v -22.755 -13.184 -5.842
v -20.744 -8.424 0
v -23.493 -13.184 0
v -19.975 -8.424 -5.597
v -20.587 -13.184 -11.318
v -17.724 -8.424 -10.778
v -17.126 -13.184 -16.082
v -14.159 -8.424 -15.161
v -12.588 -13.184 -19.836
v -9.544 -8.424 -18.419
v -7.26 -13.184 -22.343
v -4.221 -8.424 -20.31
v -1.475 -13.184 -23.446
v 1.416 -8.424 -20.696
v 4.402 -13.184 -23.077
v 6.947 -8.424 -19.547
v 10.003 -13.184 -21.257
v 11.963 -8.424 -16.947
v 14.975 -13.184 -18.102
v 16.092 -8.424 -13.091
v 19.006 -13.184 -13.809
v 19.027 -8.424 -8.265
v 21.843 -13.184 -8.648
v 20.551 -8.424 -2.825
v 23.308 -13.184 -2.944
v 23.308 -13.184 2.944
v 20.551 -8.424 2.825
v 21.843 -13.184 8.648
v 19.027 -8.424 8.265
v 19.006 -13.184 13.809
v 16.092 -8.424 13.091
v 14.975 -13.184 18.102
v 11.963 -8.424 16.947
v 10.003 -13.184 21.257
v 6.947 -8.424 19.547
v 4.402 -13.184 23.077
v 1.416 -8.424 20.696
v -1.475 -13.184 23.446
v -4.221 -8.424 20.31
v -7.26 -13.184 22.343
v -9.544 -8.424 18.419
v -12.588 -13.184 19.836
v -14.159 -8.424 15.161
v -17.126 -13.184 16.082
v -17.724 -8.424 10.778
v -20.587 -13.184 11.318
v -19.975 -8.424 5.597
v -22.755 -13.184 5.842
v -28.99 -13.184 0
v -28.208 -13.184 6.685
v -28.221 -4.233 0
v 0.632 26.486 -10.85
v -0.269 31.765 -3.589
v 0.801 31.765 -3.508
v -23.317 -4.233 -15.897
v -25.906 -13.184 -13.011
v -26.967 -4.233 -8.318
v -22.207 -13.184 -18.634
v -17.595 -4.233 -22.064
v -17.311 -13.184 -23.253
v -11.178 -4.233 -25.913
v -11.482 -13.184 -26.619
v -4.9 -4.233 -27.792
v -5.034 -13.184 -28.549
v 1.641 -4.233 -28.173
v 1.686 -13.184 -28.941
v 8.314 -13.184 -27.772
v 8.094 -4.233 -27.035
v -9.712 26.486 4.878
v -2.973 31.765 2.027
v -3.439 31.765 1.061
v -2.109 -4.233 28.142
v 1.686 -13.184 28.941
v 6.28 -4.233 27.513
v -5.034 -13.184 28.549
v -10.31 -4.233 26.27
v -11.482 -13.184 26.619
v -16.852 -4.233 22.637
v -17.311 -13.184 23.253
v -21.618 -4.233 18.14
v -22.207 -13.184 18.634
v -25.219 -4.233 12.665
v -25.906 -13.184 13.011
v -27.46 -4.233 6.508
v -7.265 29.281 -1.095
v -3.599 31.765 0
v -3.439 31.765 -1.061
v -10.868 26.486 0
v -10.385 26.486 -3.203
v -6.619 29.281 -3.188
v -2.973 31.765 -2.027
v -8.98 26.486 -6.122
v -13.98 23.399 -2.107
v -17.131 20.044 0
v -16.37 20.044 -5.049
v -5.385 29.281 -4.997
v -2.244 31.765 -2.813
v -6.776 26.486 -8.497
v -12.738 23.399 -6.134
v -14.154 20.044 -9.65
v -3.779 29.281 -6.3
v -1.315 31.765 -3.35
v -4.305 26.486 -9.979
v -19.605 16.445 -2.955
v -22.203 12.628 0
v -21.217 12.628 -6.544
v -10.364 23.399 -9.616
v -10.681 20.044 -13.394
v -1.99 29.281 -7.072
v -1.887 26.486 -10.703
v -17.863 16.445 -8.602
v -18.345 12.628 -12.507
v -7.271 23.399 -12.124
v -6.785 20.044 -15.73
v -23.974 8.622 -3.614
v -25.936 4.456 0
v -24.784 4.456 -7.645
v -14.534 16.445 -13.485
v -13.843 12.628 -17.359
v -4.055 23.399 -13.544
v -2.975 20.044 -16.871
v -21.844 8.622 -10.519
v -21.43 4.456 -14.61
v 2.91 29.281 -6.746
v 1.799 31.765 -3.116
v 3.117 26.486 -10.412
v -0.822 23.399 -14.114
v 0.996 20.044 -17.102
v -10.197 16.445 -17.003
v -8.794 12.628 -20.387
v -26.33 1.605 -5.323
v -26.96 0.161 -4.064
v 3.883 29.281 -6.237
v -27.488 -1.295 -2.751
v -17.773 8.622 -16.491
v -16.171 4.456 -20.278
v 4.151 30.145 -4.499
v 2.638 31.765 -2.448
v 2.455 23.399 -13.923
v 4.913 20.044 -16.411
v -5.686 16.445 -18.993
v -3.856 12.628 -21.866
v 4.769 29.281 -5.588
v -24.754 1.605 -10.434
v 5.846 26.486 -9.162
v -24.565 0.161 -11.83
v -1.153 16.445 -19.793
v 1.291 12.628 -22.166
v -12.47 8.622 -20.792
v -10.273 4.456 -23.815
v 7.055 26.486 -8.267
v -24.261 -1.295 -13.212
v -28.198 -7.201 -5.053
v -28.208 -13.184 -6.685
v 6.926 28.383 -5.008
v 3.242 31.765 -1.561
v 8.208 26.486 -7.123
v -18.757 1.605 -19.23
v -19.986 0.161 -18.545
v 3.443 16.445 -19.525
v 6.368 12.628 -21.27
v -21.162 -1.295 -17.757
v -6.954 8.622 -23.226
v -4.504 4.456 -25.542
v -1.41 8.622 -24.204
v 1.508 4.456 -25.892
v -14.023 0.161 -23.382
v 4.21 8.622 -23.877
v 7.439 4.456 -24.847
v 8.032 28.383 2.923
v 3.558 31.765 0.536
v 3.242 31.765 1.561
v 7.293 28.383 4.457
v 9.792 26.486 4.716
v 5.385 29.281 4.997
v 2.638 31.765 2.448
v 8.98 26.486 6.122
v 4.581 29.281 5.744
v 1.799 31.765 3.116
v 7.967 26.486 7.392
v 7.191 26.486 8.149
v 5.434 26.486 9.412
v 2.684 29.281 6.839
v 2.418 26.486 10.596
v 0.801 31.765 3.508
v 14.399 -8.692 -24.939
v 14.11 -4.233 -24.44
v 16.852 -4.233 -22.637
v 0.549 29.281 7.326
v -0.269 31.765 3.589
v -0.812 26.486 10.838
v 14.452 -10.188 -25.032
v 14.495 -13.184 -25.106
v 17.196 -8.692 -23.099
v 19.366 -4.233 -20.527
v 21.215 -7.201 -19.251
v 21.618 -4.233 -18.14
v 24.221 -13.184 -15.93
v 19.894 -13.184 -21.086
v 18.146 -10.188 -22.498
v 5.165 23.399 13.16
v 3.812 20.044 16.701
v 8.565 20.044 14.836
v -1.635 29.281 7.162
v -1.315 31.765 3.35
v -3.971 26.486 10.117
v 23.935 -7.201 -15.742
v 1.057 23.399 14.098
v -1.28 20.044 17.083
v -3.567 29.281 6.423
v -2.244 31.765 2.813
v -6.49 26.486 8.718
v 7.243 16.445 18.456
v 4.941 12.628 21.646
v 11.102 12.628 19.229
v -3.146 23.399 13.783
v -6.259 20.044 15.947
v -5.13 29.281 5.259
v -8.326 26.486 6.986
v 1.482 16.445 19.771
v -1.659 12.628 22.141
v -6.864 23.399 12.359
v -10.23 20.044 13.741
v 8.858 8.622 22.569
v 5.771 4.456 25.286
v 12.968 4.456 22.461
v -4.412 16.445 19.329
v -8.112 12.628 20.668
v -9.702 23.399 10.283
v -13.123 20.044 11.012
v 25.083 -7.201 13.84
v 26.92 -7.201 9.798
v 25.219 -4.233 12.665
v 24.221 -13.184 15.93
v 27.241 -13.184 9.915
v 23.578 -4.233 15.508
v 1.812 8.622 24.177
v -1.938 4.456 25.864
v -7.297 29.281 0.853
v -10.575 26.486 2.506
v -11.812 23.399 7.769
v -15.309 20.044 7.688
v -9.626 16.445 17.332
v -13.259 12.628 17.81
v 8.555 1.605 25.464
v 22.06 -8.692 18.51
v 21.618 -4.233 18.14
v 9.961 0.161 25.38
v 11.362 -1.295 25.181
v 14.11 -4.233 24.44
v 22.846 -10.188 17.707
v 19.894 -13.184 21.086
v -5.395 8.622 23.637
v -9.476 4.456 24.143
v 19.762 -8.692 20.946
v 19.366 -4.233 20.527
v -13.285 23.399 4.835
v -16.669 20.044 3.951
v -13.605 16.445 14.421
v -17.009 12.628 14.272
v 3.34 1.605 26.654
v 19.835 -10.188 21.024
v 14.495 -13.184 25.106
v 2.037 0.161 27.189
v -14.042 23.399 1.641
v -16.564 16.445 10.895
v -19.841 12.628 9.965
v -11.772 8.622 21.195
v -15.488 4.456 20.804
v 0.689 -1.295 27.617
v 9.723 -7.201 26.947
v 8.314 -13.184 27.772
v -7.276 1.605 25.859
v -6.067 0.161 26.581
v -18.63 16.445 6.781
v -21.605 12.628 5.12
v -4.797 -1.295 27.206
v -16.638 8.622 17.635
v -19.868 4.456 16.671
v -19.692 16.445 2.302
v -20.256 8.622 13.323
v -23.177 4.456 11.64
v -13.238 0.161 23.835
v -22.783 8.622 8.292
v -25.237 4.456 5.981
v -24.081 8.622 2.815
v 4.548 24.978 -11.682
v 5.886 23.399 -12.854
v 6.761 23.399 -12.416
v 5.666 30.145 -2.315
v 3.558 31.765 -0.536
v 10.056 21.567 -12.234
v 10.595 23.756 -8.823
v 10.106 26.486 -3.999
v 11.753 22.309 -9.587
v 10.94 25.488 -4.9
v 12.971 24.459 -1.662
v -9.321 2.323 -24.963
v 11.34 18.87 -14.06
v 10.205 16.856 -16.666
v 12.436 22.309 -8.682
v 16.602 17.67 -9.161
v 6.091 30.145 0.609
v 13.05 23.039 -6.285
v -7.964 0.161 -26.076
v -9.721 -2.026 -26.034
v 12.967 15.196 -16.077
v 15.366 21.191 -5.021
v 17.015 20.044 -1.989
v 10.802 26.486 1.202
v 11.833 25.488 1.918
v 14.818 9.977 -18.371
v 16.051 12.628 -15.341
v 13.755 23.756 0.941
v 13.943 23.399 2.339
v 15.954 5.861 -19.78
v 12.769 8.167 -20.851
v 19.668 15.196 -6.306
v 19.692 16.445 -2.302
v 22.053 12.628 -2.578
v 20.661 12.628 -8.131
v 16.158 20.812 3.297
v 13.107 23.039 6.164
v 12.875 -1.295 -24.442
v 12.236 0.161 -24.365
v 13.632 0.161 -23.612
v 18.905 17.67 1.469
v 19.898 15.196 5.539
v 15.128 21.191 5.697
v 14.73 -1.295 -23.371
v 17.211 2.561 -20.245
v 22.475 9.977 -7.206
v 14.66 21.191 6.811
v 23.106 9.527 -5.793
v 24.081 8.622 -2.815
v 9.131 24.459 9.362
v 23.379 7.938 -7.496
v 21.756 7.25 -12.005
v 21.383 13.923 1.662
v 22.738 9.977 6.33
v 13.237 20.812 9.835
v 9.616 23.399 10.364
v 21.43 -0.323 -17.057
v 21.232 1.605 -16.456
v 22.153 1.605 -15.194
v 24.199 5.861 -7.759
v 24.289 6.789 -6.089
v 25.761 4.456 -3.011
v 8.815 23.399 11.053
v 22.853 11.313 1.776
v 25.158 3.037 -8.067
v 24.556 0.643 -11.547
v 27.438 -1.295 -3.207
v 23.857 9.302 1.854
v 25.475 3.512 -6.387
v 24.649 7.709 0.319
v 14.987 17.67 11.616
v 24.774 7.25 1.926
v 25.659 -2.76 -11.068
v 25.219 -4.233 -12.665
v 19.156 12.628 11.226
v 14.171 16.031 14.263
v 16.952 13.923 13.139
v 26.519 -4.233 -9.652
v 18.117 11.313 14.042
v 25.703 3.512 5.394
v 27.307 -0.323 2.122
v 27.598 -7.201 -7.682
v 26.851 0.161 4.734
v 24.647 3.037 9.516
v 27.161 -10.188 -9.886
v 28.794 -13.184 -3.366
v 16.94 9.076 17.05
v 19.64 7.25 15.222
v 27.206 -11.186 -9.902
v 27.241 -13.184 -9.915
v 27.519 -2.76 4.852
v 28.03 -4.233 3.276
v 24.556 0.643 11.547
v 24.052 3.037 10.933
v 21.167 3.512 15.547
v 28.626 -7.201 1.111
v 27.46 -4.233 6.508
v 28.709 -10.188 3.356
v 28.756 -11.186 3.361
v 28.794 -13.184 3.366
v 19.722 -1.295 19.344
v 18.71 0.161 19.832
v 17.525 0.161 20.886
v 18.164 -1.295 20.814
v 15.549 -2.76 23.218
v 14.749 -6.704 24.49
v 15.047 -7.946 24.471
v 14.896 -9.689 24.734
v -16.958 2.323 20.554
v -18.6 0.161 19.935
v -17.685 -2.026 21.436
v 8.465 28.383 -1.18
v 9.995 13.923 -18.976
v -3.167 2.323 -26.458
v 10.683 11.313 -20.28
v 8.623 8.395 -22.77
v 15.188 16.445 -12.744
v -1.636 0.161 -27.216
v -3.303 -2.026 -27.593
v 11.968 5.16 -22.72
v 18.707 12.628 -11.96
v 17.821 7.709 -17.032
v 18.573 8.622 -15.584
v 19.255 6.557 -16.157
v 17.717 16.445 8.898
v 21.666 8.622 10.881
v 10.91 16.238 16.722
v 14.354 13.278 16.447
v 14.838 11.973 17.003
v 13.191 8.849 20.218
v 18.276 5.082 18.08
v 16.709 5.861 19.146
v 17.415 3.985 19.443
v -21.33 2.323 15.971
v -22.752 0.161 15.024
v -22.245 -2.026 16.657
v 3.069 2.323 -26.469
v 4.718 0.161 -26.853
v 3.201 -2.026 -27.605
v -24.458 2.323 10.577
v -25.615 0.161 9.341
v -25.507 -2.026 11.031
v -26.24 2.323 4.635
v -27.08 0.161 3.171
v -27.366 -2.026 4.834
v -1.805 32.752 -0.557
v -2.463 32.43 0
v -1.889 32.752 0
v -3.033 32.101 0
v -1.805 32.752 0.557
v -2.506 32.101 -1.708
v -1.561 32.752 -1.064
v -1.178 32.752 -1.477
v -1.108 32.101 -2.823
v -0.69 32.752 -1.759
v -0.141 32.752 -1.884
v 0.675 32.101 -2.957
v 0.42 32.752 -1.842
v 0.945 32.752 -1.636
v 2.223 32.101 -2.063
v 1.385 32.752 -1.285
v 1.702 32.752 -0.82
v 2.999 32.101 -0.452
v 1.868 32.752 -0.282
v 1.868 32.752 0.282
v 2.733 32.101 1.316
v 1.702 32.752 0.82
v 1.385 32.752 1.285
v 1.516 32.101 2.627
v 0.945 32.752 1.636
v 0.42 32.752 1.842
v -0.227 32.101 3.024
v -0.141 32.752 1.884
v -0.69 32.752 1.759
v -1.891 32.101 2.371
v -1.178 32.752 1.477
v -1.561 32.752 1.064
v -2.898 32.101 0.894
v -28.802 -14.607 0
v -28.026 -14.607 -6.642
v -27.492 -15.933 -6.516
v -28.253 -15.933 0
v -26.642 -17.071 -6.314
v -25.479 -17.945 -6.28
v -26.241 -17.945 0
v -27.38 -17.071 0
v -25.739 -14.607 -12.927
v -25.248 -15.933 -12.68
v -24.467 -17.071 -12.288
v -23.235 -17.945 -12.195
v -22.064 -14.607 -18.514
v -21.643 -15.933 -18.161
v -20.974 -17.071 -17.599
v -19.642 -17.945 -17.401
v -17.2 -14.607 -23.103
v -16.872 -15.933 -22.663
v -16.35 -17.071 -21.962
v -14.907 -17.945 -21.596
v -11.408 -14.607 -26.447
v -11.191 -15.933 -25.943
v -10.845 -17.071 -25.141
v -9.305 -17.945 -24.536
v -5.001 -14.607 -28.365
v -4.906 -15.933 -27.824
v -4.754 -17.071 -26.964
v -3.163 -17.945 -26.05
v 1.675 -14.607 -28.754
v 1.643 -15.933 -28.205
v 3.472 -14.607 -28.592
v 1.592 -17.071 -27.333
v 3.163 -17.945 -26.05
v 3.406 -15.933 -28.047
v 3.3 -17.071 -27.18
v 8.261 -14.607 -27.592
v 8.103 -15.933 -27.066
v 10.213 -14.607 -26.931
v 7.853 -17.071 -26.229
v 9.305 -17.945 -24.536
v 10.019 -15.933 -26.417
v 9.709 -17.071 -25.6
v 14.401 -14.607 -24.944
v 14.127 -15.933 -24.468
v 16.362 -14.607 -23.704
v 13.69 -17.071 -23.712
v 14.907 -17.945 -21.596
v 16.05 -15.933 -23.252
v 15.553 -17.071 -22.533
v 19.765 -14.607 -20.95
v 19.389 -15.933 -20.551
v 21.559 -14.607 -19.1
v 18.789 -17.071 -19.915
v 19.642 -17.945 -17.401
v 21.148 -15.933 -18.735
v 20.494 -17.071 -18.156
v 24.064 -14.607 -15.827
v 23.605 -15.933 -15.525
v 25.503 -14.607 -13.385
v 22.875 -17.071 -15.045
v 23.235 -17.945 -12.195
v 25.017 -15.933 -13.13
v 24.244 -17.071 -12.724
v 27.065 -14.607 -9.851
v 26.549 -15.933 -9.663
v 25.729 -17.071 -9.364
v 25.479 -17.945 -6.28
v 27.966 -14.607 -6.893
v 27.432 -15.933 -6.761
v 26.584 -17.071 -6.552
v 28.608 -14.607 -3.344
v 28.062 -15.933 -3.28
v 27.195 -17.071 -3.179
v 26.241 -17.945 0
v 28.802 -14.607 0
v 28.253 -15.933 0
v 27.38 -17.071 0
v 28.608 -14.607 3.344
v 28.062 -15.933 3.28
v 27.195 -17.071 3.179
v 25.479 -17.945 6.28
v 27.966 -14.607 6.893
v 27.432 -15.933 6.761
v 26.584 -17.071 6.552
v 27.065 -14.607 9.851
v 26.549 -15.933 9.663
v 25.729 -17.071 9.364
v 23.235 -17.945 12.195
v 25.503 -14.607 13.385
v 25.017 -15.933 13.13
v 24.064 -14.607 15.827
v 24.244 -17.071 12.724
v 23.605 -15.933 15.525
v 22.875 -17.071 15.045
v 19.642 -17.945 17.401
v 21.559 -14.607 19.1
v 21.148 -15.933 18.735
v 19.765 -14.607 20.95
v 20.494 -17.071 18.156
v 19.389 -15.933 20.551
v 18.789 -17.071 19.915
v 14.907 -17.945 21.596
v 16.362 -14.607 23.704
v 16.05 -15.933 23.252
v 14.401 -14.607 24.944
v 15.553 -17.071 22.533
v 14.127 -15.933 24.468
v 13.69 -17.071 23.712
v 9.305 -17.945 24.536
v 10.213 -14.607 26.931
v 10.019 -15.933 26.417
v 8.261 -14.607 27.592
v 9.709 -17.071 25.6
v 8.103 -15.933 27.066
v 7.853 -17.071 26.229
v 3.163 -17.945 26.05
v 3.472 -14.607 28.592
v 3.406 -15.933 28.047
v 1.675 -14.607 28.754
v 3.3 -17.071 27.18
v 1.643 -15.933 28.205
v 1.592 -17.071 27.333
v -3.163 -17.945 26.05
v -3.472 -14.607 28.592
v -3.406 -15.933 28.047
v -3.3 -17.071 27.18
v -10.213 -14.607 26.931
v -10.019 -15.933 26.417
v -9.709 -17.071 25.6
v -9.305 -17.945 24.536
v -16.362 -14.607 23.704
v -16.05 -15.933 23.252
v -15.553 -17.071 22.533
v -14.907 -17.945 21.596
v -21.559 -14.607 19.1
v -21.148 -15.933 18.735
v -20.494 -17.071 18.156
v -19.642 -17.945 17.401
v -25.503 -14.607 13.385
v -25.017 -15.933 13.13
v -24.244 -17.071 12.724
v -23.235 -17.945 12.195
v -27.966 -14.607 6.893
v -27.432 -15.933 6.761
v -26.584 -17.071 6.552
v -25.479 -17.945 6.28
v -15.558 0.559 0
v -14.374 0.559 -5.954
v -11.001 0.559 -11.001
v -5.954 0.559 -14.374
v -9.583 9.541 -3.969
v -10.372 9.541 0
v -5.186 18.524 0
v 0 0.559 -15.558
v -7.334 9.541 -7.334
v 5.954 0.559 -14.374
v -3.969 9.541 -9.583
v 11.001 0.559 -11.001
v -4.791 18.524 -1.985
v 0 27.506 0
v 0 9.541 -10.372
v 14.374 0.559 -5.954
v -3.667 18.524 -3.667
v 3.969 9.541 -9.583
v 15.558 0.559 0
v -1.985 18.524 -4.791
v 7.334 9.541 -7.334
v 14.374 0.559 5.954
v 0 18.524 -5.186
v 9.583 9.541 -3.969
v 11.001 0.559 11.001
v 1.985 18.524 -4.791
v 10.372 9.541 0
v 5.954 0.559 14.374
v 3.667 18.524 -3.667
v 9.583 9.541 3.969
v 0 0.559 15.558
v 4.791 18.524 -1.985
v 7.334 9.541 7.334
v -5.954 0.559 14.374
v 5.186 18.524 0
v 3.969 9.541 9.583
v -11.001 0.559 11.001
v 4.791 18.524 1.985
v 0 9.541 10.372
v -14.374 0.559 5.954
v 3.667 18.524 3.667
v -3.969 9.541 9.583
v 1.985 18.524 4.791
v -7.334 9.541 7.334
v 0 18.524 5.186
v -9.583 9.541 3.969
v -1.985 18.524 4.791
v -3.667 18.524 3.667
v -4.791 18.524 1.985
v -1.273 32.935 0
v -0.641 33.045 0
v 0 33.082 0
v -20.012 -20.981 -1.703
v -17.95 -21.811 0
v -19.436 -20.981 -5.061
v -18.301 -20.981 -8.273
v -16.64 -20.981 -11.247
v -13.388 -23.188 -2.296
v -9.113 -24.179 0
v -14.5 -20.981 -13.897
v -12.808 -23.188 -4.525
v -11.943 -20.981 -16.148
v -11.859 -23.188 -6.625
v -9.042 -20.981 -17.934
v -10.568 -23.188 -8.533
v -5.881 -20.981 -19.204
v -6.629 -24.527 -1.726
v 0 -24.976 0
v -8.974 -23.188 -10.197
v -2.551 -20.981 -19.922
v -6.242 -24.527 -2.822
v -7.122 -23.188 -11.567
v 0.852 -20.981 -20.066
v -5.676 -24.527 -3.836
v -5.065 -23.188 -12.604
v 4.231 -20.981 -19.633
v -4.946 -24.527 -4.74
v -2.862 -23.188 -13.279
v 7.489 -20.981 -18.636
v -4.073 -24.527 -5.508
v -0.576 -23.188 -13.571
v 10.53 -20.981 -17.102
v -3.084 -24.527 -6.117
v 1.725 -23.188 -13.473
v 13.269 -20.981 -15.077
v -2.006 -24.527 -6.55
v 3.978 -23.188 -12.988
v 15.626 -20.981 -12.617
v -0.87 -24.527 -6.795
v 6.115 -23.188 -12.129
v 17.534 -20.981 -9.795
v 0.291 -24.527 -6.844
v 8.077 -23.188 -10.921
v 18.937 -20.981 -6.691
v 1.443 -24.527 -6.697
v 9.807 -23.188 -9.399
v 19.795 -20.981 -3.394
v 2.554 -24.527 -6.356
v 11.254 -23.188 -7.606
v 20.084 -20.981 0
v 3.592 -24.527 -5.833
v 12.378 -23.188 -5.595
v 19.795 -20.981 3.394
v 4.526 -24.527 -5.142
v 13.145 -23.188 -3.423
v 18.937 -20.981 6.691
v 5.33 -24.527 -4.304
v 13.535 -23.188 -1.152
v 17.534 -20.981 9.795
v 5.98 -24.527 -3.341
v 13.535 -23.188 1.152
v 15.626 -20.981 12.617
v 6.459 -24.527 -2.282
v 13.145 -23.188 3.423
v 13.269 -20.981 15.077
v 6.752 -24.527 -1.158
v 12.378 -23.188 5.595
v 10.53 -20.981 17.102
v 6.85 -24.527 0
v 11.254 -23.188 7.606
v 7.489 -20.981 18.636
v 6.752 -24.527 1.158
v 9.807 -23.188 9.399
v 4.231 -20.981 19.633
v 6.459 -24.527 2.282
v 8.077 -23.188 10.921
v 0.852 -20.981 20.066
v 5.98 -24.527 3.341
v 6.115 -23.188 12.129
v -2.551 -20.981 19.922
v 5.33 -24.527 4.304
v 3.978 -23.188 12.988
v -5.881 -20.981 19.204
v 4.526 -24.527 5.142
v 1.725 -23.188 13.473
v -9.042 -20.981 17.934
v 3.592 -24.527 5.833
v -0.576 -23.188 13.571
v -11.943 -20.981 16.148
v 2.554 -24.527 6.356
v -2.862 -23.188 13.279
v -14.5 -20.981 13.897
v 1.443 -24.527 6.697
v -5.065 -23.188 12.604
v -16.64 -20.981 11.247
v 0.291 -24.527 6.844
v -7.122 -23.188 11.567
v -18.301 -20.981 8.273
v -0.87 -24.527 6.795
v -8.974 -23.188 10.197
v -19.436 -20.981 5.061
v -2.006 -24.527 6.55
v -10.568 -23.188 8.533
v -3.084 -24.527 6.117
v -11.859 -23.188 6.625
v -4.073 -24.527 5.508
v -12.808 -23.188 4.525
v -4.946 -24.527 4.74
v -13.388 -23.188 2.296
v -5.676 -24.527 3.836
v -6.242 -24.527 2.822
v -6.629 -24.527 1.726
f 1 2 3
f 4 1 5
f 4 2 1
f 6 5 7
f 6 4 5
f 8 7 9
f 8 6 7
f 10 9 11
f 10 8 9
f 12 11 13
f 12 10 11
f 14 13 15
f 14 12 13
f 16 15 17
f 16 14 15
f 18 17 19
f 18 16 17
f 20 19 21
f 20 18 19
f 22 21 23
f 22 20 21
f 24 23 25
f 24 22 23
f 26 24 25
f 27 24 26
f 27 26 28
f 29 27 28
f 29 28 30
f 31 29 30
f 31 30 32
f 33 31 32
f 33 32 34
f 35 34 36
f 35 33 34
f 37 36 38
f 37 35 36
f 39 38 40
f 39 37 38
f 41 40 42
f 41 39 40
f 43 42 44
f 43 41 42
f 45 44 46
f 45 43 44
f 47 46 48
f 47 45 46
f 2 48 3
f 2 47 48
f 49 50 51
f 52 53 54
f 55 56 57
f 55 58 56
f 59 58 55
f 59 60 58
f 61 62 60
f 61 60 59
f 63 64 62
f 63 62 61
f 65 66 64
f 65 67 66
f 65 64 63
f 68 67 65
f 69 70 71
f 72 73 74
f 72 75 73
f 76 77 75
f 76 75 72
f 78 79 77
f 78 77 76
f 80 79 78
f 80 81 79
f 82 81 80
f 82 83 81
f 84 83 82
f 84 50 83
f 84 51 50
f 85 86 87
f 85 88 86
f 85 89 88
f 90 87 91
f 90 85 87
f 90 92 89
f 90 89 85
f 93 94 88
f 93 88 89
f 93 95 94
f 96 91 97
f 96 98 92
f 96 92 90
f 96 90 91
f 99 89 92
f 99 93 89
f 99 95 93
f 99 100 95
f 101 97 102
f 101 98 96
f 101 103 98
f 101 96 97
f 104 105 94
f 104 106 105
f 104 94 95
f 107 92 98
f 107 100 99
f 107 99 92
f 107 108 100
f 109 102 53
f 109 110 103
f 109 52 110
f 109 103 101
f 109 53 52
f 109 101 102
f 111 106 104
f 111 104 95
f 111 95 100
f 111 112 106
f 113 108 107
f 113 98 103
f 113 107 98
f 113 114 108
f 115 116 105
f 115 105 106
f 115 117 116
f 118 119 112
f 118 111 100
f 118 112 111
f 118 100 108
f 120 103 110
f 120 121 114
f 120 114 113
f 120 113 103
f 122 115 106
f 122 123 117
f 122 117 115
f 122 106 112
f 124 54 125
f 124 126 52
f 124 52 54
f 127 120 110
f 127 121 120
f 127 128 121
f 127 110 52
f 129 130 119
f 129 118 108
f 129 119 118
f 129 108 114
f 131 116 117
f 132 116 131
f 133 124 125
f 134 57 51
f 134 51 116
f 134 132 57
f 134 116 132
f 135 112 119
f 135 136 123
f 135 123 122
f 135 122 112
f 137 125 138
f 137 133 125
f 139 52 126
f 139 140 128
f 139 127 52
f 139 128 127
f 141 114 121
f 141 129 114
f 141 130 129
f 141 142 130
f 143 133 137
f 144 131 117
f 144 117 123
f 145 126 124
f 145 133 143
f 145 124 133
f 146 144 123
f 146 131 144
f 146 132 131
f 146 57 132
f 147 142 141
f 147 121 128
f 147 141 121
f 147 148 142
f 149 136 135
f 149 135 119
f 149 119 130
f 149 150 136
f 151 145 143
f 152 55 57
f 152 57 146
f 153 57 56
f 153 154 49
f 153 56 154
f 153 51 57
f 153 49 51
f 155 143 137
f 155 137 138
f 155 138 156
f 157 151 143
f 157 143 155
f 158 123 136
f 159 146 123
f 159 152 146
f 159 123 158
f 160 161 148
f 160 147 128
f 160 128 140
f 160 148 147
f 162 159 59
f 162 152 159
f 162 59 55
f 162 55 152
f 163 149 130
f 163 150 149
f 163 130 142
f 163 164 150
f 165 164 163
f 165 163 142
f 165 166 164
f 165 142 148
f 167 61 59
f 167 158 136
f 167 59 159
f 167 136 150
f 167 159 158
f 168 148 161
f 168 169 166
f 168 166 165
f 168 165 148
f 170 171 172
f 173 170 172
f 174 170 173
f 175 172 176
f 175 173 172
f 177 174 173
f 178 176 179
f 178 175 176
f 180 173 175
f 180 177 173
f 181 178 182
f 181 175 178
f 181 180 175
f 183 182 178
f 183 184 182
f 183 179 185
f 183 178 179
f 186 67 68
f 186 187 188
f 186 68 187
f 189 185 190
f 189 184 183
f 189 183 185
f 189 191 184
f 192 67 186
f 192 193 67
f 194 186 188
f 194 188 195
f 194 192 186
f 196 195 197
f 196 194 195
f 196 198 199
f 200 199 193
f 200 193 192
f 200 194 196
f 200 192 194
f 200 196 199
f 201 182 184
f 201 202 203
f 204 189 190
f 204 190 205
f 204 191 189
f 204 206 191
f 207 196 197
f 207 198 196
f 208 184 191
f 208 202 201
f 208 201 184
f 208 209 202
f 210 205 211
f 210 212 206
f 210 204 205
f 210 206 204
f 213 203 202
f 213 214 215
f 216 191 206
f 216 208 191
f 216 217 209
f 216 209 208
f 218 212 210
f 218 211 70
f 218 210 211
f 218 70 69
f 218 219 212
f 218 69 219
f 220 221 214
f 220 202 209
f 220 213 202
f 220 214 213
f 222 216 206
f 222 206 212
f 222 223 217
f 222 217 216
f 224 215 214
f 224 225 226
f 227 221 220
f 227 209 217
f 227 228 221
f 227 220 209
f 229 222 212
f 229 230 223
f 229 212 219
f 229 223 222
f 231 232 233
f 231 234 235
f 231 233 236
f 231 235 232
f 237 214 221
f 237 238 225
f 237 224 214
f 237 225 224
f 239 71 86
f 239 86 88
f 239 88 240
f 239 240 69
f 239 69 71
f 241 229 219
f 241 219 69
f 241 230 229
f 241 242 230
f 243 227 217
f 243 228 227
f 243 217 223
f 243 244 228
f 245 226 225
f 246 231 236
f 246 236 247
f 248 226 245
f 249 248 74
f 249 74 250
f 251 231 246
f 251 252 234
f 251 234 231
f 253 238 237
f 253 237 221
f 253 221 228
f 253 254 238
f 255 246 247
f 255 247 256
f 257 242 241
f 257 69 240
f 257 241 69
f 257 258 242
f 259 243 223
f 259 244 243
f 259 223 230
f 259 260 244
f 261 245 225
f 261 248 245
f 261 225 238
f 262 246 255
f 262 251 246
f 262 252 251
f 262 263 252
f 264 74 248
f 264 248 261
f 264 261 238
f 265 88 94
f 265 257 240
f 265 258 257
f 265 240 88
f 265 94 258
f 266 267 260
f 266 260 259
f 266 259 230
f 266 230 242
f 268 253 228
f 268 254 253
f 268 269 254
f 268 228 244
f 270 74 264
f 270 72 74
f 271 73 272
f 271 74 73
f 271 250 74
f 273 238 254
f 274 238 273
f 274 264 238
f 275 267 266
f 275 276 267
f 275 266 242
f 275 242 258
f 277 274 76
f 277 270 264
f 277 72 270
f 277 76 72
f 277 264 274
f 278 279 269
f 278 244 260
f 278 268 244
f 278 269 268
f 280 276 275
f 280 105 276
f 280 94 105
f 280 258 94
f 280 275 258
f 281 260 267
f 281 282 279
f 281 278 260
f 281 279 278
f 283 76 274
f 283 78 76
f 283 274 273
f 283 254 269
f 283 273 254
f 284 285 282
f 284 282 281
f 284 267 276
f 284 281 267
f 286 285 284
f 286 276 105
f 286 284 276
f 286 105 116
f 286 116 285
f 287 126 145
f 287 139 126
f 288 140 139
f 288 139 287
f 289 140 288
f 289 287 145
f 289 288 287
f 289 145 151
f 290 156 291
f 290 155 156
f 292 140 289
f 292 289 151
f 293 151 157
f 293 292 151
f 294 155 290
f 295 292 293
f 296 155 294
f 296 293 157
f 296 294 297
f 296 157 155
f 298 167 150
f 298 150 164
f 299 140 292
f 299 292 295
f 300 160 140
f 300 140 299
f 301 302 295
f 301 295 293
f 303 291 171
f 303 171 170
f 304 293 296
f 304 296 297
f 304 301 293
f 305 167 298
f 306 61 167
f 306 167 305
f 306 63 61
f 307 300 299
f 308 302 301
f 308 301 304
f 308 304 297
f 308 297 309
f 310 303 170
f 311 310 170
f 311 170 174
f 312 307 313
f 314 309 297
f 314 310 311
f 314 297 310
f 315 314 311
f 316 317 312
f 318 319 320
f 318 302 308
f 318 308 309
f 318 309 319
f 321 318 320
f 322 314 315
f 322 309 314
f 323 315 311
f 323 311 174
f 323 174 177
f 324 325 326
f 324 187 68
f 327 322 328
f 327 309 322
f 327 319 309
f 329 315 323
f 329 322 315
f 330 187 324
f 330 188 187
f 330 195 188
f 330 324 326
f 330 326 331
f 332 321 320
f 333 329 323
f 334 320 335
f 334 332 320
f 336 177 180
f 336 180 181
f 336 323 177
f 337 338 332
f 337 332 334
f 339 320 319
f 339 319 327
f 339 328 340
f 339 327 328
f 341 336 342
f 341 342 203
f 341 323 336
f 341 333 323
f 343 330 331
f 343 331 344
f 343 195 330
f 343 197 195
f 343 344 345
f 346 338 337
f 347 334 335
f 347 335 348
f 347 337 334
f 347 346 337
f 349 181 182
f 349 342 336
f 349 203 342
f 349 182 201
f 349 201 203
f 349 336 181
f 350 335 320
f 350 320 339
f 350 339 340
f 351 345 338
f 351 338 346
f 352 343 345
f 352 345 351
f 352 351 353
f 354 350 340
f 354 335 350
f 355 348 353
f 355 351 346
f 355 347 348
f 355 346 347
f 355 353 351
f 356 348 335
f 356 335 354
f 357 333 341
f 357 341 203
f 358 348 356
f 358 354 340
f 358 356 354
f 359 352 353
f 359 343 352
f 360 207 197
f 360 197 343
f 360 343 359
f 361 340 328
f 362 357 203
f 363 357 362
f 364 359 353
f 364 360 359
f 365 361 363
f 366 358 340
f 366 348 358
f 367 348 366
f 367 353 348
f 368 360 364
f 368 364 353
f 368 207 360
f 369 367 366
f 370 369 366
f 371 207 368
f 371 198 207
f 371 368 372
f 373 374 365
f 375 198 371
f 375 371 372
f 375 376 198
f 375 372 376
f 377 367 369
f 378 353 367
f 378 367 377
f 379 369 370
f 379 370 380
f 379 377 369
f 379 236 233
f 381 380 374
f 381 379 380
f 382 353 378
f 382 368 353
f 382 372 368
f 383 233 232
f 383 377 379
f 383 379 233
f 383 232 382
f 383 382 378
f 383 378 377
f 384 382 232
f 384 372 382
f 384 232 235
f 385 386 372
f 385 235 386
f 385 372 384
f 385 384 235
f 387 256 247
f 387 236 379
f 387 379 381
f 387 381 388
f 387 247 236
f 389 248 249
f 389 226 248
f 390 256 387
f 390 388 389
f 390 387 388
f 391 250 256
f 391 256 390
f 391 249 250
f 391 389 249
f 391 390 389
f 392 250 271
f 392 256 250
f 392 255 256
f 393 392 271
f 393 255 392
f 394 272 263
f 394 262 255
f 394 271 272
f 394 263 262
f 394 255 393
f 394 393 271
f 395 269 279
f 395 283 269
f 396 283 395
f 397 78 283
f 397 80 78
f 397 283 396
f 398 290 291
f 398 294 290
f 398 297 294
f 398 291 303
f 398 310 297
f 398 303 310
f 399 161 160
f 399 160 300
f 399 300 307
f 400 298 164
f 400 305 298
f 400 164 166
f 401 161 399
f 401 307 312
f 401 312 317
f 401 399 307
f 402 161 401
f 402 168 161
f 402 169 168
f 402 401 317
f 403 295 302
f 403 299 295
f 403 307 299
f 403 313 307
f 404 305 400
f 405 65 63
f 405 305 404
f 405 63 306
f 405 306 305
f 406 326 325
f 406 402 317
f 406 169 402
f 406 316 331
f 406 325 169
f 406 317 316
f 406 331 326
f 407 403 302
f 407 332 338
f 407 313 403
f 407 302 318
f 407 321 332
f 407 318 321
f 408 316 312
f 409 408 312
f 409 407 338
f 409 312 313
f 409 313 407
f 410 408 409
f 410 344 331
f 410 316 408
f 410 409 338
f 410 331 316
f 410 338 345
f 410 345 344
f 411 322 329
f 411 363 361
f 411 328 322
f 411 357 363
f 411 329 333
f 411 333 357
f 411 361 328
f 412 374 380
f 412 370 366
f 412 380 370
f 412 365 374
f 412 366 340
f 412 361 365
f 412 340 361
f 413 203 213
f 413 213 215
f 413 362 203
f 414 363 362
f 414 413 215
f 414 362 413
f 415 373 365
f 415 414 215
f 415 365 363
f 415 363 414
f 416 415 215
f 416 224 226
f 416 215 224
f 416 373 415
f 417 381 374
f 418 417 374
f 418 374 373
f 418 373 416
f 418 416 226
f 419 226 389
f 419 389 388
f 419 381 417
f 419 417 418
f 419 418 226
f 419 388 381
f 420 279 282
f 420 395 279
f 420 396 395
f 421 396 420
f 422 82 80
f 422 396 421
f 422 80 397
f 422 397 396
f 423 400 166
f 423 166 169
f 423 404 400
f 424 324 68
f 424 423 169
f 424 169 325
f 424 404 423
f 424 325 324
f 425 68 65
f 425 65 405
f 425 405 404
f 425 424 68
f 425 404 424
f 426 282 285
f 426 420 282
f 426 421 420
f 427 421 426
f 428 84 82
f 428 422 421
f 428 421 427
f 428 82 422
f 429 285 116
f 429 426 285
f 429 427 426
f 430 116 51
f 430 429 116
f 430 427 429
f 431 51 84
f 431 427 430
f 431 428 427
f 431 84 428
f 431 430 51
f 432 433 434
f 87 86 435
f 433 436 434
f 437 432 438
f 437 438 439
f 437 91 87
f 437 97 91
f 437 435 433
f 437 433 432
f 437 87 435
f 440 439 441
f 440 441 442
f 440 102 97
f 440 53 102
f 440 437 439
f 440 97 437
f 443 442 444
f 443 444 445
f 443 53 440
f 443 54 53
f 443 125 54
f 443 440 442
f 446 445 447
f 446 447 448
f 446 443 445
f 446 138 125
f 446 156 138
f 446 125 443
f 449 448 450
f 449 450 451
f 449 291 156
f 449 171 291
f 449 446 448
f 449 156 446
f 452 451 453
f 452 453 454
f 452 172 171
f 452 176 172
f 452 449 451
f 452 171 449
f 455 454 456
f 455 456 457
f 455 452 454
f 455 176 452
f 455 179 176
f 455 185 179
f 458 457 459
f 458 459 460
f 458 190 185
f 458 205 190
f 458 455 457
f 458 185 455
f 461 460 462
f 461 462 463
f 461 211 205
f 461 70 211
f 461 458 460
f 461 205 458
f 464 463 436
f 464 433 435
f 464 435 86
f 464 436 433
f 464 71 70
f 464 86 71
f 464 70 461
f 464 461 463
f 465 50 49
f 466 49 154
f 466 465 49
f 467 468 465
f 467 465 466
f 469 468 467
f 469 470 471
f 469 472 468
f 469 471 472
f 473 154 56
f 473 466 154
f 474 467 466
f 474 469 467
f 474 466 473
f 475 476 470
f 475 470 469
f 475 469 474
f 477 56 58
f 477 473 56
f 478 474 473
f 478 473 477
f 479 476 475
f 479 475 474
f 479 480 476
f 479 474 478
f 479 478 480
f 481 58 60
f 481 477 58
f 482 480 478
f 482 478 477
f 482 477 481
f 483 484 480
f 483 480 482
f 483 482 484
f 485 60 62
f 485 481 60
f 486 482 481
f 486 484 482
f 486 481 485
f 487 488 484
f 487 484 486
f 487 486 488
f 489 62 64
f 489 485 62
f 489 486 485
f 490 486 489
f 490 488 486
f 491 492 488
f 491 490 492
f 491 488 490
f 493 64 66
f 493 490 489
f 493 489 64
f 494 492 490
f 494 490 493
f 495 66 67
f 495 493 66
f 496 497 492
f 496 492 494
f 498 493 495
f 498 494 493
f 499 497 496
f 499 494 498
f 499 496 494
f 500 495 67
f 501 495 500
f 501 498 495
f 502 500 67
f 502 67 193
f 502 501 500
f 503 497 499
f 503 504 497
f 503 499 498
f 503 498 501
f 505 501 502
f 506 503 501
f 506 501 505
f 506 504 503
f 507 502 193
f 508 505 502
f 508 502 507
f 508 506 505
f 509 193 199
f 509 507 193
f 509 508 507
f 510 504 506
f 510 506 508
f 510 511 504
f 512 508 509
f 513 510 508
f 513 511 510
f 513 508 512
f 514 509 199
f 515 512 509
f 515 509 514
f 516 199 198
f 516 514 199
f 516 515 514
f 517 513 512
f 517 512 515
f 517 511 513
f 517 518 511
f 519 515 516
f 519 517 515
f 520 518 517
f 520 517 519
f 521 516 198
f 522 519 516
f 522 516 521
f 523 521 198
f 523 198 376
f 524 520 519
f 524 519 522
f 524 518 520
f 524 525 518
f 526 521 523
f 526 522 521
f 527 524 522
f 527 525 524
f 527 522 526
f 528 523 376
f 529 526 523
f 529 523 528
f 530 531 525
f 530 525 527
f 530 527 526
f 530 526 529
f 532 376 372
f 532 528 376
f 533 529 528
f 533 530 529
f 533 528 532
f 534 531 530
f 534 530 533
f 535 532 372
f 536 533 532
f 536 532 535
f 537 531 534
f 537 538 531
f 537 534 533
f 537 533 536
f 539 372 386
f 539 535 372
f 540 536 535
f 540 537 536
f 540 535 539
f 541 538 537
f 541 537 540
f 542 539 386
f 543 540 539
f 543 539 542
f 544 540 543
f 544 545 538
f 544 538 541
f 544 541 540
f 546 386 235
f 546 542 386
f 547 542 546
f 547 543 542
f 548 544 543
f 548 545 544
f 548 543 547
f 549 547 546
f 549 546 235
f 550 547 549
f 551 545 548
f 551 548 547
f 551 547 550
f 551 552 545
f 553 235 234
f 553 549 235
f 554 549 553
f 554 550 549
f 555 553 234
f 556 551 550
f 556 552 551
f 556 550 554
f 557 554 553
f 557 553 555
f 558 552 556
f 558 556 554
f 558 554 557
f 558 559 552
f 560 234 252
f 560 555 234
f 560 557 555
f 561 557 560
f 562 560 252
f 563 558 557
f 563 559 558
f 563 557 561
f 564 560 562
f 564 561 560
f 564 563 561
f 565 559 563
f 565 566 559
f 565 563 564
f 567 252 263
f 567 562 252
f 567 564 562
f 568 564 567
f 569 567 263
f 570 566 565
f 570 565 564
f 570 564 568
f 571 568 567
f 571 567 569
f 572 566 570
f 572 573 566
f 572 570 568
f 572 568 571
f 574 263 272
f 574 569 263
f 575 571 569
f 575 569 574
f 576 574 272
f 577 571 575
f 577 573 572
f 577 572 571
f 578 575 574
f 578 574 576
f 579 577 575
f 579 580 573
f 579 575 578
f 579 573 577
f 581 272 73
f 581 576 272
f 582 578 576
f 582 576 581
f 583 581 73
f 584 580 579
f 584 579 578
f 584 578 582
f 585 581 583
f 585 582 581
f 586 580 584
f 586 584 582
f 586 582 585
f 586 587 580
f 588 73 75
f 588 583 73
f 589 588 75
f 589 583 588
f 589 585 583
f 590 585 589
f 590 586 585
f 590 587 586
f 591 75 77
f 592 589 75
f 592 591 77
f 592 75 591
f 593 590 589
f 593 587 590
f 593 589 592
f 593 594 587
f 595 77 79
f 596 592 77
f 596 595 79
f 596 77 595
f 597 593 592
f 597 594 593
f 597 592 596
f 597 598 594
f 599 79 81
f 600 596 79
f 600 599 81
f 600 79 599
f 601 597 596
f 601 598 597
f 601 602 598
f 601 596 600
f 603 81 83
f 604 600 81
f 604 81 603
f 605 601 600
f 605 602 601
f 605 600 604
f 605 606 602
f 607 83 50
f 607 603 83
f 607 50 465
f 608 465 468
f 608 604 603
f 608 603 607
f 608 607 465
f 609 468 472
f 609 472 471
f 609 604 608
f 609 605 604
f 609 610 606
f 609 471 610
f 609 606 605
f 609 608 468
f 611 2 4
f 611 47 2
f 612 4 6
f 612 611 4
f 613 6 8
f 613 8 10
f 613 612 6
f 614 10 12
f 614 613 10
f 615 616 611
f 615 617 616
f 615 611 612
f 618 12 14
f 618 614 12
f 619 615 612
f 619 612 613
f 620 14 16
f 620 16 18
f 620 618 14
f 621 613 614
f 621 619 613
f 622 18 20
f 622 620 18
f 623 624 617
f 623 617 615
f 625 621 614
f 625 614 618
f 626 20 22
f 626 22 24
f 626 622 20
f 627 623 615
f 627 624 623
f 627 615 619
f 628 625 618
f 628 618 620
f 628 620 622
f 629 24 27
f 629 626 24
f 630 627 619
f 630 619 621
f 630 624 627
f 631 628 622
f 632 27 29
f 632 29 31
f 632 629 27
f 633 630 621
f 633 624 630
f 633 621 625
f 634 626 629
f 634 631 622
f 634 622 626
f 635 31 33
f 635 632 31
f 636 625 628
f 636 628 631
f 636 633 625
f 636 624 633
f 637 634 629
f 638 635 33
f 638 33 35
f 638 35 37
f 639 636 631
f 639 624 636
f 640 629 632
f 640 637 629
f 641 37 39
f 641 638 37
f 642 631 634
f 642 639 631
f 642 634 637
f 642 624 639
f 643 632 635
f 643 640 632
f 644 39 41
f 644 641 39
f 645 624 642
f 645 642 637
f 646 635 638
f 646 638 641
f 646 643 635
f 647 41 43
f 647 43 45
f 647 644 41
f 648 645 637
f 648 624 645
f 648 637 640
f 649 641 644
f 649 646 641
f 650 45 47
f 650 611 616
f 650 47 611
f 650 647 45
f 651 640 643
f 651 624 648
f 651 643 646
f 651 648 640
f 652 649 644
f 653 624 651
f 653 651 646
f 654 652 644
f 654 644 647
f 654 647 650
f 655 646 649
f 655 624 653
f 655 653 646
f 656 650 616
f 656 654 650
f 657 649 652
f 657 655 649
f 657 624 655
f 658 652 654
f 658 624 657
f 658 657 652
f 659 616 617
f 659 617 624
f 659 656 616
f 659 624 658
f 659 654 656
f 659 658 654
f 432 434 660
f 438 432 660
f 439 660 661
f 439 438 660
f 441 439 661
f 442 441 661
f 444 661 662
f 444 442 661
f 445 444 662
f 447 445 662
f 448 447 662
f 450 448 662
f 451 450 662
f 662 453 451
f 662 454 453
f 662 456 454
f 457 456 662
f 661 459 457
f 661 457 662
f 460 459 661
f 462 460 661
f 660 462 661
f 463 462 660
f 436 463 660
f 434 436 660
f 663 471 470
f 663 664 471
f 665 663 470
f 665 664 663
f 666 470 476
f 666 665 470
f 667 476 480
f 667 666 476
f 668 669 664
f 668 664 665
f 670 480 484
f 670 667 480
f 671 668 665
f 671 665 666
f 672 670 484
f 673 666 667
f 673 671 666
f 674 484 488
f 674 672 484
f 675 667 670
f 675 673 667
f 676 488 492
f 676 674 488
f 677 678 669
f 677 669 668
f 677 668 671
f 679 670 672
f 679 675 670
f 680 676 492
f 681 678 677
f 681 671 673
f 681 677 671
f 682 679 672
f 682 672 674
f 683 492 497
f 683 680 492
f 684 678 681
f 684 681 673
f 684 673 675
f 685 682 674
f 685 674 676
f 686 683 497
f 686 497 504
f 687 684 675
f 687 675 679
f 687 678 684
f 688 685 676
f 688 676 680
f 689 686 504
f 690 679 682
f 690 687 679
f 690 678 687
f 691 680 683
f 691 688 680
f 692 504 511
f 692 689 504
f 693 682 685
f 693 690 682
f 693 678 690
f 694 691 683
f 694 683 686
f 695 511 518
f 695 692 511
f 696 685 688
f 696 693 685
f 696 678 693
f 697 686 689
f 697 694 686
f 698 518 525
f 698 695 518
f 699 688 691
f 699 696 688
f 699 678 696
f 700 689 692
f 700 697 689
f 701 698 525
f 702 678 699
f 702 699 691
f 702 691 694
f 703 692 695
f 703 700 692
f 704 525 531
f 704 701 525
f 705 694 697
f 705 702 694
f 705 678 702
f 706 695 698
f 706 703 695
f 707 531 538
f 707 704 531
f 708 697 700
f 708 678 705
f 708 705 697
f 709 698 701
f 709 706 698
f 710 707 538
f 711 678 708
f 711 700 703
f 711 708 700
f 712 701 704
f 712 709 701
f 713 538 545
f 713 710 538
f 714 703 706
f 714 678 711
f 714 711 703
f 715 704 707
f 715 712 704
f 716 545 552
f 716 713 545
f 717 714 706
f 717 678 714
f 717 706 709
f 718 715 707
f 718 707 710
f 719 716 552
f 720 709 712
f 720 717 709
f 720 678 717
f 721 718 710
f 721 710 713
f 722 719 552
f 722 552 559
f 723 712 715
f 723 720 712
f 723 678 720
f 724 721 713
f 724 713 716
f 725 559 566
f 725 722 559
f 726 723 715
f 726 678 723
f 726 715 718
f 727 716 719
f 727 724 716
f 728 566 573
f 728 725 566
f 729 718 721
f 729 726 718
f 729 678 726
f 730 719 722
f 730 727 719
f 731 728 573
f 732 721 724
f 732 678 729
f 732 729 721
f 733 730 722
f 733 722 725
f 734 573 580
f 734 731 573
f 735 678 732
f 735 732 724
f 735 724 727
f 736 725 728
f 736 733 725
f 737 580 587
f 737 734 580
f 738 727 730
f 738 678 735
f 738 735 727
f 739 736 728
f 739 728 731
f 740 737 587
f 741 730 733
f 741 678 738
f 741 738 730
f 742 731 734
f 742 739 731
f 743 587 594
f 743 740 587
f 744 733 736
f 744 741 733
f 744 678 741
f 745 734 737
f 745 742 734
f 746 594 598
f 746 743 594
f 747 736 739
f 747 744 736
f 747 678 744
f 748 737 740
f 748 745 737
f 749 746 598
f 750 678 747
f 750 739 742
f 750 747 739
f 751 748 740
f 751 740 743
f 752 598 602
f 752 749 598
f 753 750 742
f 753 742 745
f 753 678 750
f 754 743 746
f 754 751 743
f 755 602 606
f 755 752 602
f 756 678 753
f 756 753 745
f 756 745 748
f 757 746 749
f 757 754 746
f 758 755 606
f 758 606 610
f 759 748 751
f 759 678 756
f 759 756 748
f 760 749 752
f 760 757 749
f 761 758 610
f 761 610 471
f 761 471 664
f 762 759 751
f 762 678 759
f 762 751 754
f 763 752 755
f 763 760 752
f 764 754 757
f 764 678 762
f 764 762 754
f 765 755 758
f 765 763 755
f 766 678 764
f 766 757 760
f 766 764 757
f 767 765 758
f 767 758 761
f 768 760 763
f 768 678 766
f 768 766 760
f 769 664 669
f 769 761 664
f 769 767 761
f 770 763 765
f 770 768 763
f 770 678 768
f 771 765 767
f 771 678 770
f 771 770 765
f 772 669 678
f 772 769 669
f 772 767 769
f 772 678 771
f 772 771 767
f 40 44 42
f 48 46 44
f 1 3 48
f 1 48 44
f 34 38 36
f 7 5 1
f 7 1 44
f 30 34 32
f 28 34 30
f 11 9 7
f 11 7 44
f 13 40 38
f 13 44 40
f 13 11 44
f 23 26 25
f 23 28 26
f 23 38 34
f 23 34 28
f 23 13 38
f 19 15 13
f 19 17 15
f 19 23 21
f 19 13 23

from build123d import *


with BuildPart() as f1:
    # F0 (on Top) → F1 (revolve)
    with BuildSketch(Plane.XY):
        with BuildLine():
            Line((-20.7443091924, -8.42390999), (-2.787864159, 22.6775651312))
            ThreePointArc((-2.787864159, 22.6775651312), (-5.5536730214, 27.0108460323), (-3.5985761906, 31.7652774823))
            ThreePointArc((-3.5985761906, 31.7652774823), (-22.2031678624, 12.6283058176), (-28.9897531426, -13.1844192613))
            ThreePointArc((-28.9897531426, -13.1844192613), (-26.2412718203, -8.4239099867), (-20.7443091924, -8.42390999))
        make_face()
        with BuildLine():
            Line((-23.4927905091, -13.1844192742), (-20.7443091924, -8.42390999))
            ThreePointArc((-20.7443091924, -8.42390999), (-26.2412718203, -8.4239099867), (-28.9897531426, -13.1844192613))
            ThreePointArc((-28.9897531426, -13.1844192613), (-28.2532997759, -15.9329006212), (-26.2412717541, -17.9449285999))
            ThreePointArc((-26.2412717541, -17.9449285999), (-20.7443091565, -17.9449285378), (-17.9958278756, -13.1844192742))
            Line((-17.9958278756, -13.1844192742), (-23.4927905091, -13.1844192742))
        make_face()
        with BuildLine():
            Line((0, -24.9762561526), (0, -13.1844192742))
            Line((0, -13.1844192742), (-17.9958278756, -13.1844192742))
            ThreePointArc((-17.9958278756, -13.1844192742), (-20.7443091565, -17.9449285378), (-26.2412717541, -17.9449285999))
            ThreePointArc((-26.2412717541, -17.9449285999), (-13.5834817925, -23.1879568541), (0, -24.9762561526))
        make_face()
        with BuildLine():
            Line((-2.787864159, 22.6775651312), (0, 27.5062874992))
            Line((0, 27.5062874992), (0, 33.0820158171))
            ThreePointArc((0, 33.0820158171), (-0.9588366399, 32.9989533886), (-1.8891054245, 32.7522408892))
            ThreePointArc((-1.8891054245, 32.7522408892), (-2.7484813167, 32.2667967834), (-3.5985761906, 31.7652774823))
            ThreePointArc((-3.5985761906, 31.7652774823), (-5.5536730214, 27.0108460323), (-2.787864159, 22.6775651312))
        make_face()
    revolve(axis=Axis((0, 4.3850952799, 0), (0, -1, 0)))


solid = f1.part
